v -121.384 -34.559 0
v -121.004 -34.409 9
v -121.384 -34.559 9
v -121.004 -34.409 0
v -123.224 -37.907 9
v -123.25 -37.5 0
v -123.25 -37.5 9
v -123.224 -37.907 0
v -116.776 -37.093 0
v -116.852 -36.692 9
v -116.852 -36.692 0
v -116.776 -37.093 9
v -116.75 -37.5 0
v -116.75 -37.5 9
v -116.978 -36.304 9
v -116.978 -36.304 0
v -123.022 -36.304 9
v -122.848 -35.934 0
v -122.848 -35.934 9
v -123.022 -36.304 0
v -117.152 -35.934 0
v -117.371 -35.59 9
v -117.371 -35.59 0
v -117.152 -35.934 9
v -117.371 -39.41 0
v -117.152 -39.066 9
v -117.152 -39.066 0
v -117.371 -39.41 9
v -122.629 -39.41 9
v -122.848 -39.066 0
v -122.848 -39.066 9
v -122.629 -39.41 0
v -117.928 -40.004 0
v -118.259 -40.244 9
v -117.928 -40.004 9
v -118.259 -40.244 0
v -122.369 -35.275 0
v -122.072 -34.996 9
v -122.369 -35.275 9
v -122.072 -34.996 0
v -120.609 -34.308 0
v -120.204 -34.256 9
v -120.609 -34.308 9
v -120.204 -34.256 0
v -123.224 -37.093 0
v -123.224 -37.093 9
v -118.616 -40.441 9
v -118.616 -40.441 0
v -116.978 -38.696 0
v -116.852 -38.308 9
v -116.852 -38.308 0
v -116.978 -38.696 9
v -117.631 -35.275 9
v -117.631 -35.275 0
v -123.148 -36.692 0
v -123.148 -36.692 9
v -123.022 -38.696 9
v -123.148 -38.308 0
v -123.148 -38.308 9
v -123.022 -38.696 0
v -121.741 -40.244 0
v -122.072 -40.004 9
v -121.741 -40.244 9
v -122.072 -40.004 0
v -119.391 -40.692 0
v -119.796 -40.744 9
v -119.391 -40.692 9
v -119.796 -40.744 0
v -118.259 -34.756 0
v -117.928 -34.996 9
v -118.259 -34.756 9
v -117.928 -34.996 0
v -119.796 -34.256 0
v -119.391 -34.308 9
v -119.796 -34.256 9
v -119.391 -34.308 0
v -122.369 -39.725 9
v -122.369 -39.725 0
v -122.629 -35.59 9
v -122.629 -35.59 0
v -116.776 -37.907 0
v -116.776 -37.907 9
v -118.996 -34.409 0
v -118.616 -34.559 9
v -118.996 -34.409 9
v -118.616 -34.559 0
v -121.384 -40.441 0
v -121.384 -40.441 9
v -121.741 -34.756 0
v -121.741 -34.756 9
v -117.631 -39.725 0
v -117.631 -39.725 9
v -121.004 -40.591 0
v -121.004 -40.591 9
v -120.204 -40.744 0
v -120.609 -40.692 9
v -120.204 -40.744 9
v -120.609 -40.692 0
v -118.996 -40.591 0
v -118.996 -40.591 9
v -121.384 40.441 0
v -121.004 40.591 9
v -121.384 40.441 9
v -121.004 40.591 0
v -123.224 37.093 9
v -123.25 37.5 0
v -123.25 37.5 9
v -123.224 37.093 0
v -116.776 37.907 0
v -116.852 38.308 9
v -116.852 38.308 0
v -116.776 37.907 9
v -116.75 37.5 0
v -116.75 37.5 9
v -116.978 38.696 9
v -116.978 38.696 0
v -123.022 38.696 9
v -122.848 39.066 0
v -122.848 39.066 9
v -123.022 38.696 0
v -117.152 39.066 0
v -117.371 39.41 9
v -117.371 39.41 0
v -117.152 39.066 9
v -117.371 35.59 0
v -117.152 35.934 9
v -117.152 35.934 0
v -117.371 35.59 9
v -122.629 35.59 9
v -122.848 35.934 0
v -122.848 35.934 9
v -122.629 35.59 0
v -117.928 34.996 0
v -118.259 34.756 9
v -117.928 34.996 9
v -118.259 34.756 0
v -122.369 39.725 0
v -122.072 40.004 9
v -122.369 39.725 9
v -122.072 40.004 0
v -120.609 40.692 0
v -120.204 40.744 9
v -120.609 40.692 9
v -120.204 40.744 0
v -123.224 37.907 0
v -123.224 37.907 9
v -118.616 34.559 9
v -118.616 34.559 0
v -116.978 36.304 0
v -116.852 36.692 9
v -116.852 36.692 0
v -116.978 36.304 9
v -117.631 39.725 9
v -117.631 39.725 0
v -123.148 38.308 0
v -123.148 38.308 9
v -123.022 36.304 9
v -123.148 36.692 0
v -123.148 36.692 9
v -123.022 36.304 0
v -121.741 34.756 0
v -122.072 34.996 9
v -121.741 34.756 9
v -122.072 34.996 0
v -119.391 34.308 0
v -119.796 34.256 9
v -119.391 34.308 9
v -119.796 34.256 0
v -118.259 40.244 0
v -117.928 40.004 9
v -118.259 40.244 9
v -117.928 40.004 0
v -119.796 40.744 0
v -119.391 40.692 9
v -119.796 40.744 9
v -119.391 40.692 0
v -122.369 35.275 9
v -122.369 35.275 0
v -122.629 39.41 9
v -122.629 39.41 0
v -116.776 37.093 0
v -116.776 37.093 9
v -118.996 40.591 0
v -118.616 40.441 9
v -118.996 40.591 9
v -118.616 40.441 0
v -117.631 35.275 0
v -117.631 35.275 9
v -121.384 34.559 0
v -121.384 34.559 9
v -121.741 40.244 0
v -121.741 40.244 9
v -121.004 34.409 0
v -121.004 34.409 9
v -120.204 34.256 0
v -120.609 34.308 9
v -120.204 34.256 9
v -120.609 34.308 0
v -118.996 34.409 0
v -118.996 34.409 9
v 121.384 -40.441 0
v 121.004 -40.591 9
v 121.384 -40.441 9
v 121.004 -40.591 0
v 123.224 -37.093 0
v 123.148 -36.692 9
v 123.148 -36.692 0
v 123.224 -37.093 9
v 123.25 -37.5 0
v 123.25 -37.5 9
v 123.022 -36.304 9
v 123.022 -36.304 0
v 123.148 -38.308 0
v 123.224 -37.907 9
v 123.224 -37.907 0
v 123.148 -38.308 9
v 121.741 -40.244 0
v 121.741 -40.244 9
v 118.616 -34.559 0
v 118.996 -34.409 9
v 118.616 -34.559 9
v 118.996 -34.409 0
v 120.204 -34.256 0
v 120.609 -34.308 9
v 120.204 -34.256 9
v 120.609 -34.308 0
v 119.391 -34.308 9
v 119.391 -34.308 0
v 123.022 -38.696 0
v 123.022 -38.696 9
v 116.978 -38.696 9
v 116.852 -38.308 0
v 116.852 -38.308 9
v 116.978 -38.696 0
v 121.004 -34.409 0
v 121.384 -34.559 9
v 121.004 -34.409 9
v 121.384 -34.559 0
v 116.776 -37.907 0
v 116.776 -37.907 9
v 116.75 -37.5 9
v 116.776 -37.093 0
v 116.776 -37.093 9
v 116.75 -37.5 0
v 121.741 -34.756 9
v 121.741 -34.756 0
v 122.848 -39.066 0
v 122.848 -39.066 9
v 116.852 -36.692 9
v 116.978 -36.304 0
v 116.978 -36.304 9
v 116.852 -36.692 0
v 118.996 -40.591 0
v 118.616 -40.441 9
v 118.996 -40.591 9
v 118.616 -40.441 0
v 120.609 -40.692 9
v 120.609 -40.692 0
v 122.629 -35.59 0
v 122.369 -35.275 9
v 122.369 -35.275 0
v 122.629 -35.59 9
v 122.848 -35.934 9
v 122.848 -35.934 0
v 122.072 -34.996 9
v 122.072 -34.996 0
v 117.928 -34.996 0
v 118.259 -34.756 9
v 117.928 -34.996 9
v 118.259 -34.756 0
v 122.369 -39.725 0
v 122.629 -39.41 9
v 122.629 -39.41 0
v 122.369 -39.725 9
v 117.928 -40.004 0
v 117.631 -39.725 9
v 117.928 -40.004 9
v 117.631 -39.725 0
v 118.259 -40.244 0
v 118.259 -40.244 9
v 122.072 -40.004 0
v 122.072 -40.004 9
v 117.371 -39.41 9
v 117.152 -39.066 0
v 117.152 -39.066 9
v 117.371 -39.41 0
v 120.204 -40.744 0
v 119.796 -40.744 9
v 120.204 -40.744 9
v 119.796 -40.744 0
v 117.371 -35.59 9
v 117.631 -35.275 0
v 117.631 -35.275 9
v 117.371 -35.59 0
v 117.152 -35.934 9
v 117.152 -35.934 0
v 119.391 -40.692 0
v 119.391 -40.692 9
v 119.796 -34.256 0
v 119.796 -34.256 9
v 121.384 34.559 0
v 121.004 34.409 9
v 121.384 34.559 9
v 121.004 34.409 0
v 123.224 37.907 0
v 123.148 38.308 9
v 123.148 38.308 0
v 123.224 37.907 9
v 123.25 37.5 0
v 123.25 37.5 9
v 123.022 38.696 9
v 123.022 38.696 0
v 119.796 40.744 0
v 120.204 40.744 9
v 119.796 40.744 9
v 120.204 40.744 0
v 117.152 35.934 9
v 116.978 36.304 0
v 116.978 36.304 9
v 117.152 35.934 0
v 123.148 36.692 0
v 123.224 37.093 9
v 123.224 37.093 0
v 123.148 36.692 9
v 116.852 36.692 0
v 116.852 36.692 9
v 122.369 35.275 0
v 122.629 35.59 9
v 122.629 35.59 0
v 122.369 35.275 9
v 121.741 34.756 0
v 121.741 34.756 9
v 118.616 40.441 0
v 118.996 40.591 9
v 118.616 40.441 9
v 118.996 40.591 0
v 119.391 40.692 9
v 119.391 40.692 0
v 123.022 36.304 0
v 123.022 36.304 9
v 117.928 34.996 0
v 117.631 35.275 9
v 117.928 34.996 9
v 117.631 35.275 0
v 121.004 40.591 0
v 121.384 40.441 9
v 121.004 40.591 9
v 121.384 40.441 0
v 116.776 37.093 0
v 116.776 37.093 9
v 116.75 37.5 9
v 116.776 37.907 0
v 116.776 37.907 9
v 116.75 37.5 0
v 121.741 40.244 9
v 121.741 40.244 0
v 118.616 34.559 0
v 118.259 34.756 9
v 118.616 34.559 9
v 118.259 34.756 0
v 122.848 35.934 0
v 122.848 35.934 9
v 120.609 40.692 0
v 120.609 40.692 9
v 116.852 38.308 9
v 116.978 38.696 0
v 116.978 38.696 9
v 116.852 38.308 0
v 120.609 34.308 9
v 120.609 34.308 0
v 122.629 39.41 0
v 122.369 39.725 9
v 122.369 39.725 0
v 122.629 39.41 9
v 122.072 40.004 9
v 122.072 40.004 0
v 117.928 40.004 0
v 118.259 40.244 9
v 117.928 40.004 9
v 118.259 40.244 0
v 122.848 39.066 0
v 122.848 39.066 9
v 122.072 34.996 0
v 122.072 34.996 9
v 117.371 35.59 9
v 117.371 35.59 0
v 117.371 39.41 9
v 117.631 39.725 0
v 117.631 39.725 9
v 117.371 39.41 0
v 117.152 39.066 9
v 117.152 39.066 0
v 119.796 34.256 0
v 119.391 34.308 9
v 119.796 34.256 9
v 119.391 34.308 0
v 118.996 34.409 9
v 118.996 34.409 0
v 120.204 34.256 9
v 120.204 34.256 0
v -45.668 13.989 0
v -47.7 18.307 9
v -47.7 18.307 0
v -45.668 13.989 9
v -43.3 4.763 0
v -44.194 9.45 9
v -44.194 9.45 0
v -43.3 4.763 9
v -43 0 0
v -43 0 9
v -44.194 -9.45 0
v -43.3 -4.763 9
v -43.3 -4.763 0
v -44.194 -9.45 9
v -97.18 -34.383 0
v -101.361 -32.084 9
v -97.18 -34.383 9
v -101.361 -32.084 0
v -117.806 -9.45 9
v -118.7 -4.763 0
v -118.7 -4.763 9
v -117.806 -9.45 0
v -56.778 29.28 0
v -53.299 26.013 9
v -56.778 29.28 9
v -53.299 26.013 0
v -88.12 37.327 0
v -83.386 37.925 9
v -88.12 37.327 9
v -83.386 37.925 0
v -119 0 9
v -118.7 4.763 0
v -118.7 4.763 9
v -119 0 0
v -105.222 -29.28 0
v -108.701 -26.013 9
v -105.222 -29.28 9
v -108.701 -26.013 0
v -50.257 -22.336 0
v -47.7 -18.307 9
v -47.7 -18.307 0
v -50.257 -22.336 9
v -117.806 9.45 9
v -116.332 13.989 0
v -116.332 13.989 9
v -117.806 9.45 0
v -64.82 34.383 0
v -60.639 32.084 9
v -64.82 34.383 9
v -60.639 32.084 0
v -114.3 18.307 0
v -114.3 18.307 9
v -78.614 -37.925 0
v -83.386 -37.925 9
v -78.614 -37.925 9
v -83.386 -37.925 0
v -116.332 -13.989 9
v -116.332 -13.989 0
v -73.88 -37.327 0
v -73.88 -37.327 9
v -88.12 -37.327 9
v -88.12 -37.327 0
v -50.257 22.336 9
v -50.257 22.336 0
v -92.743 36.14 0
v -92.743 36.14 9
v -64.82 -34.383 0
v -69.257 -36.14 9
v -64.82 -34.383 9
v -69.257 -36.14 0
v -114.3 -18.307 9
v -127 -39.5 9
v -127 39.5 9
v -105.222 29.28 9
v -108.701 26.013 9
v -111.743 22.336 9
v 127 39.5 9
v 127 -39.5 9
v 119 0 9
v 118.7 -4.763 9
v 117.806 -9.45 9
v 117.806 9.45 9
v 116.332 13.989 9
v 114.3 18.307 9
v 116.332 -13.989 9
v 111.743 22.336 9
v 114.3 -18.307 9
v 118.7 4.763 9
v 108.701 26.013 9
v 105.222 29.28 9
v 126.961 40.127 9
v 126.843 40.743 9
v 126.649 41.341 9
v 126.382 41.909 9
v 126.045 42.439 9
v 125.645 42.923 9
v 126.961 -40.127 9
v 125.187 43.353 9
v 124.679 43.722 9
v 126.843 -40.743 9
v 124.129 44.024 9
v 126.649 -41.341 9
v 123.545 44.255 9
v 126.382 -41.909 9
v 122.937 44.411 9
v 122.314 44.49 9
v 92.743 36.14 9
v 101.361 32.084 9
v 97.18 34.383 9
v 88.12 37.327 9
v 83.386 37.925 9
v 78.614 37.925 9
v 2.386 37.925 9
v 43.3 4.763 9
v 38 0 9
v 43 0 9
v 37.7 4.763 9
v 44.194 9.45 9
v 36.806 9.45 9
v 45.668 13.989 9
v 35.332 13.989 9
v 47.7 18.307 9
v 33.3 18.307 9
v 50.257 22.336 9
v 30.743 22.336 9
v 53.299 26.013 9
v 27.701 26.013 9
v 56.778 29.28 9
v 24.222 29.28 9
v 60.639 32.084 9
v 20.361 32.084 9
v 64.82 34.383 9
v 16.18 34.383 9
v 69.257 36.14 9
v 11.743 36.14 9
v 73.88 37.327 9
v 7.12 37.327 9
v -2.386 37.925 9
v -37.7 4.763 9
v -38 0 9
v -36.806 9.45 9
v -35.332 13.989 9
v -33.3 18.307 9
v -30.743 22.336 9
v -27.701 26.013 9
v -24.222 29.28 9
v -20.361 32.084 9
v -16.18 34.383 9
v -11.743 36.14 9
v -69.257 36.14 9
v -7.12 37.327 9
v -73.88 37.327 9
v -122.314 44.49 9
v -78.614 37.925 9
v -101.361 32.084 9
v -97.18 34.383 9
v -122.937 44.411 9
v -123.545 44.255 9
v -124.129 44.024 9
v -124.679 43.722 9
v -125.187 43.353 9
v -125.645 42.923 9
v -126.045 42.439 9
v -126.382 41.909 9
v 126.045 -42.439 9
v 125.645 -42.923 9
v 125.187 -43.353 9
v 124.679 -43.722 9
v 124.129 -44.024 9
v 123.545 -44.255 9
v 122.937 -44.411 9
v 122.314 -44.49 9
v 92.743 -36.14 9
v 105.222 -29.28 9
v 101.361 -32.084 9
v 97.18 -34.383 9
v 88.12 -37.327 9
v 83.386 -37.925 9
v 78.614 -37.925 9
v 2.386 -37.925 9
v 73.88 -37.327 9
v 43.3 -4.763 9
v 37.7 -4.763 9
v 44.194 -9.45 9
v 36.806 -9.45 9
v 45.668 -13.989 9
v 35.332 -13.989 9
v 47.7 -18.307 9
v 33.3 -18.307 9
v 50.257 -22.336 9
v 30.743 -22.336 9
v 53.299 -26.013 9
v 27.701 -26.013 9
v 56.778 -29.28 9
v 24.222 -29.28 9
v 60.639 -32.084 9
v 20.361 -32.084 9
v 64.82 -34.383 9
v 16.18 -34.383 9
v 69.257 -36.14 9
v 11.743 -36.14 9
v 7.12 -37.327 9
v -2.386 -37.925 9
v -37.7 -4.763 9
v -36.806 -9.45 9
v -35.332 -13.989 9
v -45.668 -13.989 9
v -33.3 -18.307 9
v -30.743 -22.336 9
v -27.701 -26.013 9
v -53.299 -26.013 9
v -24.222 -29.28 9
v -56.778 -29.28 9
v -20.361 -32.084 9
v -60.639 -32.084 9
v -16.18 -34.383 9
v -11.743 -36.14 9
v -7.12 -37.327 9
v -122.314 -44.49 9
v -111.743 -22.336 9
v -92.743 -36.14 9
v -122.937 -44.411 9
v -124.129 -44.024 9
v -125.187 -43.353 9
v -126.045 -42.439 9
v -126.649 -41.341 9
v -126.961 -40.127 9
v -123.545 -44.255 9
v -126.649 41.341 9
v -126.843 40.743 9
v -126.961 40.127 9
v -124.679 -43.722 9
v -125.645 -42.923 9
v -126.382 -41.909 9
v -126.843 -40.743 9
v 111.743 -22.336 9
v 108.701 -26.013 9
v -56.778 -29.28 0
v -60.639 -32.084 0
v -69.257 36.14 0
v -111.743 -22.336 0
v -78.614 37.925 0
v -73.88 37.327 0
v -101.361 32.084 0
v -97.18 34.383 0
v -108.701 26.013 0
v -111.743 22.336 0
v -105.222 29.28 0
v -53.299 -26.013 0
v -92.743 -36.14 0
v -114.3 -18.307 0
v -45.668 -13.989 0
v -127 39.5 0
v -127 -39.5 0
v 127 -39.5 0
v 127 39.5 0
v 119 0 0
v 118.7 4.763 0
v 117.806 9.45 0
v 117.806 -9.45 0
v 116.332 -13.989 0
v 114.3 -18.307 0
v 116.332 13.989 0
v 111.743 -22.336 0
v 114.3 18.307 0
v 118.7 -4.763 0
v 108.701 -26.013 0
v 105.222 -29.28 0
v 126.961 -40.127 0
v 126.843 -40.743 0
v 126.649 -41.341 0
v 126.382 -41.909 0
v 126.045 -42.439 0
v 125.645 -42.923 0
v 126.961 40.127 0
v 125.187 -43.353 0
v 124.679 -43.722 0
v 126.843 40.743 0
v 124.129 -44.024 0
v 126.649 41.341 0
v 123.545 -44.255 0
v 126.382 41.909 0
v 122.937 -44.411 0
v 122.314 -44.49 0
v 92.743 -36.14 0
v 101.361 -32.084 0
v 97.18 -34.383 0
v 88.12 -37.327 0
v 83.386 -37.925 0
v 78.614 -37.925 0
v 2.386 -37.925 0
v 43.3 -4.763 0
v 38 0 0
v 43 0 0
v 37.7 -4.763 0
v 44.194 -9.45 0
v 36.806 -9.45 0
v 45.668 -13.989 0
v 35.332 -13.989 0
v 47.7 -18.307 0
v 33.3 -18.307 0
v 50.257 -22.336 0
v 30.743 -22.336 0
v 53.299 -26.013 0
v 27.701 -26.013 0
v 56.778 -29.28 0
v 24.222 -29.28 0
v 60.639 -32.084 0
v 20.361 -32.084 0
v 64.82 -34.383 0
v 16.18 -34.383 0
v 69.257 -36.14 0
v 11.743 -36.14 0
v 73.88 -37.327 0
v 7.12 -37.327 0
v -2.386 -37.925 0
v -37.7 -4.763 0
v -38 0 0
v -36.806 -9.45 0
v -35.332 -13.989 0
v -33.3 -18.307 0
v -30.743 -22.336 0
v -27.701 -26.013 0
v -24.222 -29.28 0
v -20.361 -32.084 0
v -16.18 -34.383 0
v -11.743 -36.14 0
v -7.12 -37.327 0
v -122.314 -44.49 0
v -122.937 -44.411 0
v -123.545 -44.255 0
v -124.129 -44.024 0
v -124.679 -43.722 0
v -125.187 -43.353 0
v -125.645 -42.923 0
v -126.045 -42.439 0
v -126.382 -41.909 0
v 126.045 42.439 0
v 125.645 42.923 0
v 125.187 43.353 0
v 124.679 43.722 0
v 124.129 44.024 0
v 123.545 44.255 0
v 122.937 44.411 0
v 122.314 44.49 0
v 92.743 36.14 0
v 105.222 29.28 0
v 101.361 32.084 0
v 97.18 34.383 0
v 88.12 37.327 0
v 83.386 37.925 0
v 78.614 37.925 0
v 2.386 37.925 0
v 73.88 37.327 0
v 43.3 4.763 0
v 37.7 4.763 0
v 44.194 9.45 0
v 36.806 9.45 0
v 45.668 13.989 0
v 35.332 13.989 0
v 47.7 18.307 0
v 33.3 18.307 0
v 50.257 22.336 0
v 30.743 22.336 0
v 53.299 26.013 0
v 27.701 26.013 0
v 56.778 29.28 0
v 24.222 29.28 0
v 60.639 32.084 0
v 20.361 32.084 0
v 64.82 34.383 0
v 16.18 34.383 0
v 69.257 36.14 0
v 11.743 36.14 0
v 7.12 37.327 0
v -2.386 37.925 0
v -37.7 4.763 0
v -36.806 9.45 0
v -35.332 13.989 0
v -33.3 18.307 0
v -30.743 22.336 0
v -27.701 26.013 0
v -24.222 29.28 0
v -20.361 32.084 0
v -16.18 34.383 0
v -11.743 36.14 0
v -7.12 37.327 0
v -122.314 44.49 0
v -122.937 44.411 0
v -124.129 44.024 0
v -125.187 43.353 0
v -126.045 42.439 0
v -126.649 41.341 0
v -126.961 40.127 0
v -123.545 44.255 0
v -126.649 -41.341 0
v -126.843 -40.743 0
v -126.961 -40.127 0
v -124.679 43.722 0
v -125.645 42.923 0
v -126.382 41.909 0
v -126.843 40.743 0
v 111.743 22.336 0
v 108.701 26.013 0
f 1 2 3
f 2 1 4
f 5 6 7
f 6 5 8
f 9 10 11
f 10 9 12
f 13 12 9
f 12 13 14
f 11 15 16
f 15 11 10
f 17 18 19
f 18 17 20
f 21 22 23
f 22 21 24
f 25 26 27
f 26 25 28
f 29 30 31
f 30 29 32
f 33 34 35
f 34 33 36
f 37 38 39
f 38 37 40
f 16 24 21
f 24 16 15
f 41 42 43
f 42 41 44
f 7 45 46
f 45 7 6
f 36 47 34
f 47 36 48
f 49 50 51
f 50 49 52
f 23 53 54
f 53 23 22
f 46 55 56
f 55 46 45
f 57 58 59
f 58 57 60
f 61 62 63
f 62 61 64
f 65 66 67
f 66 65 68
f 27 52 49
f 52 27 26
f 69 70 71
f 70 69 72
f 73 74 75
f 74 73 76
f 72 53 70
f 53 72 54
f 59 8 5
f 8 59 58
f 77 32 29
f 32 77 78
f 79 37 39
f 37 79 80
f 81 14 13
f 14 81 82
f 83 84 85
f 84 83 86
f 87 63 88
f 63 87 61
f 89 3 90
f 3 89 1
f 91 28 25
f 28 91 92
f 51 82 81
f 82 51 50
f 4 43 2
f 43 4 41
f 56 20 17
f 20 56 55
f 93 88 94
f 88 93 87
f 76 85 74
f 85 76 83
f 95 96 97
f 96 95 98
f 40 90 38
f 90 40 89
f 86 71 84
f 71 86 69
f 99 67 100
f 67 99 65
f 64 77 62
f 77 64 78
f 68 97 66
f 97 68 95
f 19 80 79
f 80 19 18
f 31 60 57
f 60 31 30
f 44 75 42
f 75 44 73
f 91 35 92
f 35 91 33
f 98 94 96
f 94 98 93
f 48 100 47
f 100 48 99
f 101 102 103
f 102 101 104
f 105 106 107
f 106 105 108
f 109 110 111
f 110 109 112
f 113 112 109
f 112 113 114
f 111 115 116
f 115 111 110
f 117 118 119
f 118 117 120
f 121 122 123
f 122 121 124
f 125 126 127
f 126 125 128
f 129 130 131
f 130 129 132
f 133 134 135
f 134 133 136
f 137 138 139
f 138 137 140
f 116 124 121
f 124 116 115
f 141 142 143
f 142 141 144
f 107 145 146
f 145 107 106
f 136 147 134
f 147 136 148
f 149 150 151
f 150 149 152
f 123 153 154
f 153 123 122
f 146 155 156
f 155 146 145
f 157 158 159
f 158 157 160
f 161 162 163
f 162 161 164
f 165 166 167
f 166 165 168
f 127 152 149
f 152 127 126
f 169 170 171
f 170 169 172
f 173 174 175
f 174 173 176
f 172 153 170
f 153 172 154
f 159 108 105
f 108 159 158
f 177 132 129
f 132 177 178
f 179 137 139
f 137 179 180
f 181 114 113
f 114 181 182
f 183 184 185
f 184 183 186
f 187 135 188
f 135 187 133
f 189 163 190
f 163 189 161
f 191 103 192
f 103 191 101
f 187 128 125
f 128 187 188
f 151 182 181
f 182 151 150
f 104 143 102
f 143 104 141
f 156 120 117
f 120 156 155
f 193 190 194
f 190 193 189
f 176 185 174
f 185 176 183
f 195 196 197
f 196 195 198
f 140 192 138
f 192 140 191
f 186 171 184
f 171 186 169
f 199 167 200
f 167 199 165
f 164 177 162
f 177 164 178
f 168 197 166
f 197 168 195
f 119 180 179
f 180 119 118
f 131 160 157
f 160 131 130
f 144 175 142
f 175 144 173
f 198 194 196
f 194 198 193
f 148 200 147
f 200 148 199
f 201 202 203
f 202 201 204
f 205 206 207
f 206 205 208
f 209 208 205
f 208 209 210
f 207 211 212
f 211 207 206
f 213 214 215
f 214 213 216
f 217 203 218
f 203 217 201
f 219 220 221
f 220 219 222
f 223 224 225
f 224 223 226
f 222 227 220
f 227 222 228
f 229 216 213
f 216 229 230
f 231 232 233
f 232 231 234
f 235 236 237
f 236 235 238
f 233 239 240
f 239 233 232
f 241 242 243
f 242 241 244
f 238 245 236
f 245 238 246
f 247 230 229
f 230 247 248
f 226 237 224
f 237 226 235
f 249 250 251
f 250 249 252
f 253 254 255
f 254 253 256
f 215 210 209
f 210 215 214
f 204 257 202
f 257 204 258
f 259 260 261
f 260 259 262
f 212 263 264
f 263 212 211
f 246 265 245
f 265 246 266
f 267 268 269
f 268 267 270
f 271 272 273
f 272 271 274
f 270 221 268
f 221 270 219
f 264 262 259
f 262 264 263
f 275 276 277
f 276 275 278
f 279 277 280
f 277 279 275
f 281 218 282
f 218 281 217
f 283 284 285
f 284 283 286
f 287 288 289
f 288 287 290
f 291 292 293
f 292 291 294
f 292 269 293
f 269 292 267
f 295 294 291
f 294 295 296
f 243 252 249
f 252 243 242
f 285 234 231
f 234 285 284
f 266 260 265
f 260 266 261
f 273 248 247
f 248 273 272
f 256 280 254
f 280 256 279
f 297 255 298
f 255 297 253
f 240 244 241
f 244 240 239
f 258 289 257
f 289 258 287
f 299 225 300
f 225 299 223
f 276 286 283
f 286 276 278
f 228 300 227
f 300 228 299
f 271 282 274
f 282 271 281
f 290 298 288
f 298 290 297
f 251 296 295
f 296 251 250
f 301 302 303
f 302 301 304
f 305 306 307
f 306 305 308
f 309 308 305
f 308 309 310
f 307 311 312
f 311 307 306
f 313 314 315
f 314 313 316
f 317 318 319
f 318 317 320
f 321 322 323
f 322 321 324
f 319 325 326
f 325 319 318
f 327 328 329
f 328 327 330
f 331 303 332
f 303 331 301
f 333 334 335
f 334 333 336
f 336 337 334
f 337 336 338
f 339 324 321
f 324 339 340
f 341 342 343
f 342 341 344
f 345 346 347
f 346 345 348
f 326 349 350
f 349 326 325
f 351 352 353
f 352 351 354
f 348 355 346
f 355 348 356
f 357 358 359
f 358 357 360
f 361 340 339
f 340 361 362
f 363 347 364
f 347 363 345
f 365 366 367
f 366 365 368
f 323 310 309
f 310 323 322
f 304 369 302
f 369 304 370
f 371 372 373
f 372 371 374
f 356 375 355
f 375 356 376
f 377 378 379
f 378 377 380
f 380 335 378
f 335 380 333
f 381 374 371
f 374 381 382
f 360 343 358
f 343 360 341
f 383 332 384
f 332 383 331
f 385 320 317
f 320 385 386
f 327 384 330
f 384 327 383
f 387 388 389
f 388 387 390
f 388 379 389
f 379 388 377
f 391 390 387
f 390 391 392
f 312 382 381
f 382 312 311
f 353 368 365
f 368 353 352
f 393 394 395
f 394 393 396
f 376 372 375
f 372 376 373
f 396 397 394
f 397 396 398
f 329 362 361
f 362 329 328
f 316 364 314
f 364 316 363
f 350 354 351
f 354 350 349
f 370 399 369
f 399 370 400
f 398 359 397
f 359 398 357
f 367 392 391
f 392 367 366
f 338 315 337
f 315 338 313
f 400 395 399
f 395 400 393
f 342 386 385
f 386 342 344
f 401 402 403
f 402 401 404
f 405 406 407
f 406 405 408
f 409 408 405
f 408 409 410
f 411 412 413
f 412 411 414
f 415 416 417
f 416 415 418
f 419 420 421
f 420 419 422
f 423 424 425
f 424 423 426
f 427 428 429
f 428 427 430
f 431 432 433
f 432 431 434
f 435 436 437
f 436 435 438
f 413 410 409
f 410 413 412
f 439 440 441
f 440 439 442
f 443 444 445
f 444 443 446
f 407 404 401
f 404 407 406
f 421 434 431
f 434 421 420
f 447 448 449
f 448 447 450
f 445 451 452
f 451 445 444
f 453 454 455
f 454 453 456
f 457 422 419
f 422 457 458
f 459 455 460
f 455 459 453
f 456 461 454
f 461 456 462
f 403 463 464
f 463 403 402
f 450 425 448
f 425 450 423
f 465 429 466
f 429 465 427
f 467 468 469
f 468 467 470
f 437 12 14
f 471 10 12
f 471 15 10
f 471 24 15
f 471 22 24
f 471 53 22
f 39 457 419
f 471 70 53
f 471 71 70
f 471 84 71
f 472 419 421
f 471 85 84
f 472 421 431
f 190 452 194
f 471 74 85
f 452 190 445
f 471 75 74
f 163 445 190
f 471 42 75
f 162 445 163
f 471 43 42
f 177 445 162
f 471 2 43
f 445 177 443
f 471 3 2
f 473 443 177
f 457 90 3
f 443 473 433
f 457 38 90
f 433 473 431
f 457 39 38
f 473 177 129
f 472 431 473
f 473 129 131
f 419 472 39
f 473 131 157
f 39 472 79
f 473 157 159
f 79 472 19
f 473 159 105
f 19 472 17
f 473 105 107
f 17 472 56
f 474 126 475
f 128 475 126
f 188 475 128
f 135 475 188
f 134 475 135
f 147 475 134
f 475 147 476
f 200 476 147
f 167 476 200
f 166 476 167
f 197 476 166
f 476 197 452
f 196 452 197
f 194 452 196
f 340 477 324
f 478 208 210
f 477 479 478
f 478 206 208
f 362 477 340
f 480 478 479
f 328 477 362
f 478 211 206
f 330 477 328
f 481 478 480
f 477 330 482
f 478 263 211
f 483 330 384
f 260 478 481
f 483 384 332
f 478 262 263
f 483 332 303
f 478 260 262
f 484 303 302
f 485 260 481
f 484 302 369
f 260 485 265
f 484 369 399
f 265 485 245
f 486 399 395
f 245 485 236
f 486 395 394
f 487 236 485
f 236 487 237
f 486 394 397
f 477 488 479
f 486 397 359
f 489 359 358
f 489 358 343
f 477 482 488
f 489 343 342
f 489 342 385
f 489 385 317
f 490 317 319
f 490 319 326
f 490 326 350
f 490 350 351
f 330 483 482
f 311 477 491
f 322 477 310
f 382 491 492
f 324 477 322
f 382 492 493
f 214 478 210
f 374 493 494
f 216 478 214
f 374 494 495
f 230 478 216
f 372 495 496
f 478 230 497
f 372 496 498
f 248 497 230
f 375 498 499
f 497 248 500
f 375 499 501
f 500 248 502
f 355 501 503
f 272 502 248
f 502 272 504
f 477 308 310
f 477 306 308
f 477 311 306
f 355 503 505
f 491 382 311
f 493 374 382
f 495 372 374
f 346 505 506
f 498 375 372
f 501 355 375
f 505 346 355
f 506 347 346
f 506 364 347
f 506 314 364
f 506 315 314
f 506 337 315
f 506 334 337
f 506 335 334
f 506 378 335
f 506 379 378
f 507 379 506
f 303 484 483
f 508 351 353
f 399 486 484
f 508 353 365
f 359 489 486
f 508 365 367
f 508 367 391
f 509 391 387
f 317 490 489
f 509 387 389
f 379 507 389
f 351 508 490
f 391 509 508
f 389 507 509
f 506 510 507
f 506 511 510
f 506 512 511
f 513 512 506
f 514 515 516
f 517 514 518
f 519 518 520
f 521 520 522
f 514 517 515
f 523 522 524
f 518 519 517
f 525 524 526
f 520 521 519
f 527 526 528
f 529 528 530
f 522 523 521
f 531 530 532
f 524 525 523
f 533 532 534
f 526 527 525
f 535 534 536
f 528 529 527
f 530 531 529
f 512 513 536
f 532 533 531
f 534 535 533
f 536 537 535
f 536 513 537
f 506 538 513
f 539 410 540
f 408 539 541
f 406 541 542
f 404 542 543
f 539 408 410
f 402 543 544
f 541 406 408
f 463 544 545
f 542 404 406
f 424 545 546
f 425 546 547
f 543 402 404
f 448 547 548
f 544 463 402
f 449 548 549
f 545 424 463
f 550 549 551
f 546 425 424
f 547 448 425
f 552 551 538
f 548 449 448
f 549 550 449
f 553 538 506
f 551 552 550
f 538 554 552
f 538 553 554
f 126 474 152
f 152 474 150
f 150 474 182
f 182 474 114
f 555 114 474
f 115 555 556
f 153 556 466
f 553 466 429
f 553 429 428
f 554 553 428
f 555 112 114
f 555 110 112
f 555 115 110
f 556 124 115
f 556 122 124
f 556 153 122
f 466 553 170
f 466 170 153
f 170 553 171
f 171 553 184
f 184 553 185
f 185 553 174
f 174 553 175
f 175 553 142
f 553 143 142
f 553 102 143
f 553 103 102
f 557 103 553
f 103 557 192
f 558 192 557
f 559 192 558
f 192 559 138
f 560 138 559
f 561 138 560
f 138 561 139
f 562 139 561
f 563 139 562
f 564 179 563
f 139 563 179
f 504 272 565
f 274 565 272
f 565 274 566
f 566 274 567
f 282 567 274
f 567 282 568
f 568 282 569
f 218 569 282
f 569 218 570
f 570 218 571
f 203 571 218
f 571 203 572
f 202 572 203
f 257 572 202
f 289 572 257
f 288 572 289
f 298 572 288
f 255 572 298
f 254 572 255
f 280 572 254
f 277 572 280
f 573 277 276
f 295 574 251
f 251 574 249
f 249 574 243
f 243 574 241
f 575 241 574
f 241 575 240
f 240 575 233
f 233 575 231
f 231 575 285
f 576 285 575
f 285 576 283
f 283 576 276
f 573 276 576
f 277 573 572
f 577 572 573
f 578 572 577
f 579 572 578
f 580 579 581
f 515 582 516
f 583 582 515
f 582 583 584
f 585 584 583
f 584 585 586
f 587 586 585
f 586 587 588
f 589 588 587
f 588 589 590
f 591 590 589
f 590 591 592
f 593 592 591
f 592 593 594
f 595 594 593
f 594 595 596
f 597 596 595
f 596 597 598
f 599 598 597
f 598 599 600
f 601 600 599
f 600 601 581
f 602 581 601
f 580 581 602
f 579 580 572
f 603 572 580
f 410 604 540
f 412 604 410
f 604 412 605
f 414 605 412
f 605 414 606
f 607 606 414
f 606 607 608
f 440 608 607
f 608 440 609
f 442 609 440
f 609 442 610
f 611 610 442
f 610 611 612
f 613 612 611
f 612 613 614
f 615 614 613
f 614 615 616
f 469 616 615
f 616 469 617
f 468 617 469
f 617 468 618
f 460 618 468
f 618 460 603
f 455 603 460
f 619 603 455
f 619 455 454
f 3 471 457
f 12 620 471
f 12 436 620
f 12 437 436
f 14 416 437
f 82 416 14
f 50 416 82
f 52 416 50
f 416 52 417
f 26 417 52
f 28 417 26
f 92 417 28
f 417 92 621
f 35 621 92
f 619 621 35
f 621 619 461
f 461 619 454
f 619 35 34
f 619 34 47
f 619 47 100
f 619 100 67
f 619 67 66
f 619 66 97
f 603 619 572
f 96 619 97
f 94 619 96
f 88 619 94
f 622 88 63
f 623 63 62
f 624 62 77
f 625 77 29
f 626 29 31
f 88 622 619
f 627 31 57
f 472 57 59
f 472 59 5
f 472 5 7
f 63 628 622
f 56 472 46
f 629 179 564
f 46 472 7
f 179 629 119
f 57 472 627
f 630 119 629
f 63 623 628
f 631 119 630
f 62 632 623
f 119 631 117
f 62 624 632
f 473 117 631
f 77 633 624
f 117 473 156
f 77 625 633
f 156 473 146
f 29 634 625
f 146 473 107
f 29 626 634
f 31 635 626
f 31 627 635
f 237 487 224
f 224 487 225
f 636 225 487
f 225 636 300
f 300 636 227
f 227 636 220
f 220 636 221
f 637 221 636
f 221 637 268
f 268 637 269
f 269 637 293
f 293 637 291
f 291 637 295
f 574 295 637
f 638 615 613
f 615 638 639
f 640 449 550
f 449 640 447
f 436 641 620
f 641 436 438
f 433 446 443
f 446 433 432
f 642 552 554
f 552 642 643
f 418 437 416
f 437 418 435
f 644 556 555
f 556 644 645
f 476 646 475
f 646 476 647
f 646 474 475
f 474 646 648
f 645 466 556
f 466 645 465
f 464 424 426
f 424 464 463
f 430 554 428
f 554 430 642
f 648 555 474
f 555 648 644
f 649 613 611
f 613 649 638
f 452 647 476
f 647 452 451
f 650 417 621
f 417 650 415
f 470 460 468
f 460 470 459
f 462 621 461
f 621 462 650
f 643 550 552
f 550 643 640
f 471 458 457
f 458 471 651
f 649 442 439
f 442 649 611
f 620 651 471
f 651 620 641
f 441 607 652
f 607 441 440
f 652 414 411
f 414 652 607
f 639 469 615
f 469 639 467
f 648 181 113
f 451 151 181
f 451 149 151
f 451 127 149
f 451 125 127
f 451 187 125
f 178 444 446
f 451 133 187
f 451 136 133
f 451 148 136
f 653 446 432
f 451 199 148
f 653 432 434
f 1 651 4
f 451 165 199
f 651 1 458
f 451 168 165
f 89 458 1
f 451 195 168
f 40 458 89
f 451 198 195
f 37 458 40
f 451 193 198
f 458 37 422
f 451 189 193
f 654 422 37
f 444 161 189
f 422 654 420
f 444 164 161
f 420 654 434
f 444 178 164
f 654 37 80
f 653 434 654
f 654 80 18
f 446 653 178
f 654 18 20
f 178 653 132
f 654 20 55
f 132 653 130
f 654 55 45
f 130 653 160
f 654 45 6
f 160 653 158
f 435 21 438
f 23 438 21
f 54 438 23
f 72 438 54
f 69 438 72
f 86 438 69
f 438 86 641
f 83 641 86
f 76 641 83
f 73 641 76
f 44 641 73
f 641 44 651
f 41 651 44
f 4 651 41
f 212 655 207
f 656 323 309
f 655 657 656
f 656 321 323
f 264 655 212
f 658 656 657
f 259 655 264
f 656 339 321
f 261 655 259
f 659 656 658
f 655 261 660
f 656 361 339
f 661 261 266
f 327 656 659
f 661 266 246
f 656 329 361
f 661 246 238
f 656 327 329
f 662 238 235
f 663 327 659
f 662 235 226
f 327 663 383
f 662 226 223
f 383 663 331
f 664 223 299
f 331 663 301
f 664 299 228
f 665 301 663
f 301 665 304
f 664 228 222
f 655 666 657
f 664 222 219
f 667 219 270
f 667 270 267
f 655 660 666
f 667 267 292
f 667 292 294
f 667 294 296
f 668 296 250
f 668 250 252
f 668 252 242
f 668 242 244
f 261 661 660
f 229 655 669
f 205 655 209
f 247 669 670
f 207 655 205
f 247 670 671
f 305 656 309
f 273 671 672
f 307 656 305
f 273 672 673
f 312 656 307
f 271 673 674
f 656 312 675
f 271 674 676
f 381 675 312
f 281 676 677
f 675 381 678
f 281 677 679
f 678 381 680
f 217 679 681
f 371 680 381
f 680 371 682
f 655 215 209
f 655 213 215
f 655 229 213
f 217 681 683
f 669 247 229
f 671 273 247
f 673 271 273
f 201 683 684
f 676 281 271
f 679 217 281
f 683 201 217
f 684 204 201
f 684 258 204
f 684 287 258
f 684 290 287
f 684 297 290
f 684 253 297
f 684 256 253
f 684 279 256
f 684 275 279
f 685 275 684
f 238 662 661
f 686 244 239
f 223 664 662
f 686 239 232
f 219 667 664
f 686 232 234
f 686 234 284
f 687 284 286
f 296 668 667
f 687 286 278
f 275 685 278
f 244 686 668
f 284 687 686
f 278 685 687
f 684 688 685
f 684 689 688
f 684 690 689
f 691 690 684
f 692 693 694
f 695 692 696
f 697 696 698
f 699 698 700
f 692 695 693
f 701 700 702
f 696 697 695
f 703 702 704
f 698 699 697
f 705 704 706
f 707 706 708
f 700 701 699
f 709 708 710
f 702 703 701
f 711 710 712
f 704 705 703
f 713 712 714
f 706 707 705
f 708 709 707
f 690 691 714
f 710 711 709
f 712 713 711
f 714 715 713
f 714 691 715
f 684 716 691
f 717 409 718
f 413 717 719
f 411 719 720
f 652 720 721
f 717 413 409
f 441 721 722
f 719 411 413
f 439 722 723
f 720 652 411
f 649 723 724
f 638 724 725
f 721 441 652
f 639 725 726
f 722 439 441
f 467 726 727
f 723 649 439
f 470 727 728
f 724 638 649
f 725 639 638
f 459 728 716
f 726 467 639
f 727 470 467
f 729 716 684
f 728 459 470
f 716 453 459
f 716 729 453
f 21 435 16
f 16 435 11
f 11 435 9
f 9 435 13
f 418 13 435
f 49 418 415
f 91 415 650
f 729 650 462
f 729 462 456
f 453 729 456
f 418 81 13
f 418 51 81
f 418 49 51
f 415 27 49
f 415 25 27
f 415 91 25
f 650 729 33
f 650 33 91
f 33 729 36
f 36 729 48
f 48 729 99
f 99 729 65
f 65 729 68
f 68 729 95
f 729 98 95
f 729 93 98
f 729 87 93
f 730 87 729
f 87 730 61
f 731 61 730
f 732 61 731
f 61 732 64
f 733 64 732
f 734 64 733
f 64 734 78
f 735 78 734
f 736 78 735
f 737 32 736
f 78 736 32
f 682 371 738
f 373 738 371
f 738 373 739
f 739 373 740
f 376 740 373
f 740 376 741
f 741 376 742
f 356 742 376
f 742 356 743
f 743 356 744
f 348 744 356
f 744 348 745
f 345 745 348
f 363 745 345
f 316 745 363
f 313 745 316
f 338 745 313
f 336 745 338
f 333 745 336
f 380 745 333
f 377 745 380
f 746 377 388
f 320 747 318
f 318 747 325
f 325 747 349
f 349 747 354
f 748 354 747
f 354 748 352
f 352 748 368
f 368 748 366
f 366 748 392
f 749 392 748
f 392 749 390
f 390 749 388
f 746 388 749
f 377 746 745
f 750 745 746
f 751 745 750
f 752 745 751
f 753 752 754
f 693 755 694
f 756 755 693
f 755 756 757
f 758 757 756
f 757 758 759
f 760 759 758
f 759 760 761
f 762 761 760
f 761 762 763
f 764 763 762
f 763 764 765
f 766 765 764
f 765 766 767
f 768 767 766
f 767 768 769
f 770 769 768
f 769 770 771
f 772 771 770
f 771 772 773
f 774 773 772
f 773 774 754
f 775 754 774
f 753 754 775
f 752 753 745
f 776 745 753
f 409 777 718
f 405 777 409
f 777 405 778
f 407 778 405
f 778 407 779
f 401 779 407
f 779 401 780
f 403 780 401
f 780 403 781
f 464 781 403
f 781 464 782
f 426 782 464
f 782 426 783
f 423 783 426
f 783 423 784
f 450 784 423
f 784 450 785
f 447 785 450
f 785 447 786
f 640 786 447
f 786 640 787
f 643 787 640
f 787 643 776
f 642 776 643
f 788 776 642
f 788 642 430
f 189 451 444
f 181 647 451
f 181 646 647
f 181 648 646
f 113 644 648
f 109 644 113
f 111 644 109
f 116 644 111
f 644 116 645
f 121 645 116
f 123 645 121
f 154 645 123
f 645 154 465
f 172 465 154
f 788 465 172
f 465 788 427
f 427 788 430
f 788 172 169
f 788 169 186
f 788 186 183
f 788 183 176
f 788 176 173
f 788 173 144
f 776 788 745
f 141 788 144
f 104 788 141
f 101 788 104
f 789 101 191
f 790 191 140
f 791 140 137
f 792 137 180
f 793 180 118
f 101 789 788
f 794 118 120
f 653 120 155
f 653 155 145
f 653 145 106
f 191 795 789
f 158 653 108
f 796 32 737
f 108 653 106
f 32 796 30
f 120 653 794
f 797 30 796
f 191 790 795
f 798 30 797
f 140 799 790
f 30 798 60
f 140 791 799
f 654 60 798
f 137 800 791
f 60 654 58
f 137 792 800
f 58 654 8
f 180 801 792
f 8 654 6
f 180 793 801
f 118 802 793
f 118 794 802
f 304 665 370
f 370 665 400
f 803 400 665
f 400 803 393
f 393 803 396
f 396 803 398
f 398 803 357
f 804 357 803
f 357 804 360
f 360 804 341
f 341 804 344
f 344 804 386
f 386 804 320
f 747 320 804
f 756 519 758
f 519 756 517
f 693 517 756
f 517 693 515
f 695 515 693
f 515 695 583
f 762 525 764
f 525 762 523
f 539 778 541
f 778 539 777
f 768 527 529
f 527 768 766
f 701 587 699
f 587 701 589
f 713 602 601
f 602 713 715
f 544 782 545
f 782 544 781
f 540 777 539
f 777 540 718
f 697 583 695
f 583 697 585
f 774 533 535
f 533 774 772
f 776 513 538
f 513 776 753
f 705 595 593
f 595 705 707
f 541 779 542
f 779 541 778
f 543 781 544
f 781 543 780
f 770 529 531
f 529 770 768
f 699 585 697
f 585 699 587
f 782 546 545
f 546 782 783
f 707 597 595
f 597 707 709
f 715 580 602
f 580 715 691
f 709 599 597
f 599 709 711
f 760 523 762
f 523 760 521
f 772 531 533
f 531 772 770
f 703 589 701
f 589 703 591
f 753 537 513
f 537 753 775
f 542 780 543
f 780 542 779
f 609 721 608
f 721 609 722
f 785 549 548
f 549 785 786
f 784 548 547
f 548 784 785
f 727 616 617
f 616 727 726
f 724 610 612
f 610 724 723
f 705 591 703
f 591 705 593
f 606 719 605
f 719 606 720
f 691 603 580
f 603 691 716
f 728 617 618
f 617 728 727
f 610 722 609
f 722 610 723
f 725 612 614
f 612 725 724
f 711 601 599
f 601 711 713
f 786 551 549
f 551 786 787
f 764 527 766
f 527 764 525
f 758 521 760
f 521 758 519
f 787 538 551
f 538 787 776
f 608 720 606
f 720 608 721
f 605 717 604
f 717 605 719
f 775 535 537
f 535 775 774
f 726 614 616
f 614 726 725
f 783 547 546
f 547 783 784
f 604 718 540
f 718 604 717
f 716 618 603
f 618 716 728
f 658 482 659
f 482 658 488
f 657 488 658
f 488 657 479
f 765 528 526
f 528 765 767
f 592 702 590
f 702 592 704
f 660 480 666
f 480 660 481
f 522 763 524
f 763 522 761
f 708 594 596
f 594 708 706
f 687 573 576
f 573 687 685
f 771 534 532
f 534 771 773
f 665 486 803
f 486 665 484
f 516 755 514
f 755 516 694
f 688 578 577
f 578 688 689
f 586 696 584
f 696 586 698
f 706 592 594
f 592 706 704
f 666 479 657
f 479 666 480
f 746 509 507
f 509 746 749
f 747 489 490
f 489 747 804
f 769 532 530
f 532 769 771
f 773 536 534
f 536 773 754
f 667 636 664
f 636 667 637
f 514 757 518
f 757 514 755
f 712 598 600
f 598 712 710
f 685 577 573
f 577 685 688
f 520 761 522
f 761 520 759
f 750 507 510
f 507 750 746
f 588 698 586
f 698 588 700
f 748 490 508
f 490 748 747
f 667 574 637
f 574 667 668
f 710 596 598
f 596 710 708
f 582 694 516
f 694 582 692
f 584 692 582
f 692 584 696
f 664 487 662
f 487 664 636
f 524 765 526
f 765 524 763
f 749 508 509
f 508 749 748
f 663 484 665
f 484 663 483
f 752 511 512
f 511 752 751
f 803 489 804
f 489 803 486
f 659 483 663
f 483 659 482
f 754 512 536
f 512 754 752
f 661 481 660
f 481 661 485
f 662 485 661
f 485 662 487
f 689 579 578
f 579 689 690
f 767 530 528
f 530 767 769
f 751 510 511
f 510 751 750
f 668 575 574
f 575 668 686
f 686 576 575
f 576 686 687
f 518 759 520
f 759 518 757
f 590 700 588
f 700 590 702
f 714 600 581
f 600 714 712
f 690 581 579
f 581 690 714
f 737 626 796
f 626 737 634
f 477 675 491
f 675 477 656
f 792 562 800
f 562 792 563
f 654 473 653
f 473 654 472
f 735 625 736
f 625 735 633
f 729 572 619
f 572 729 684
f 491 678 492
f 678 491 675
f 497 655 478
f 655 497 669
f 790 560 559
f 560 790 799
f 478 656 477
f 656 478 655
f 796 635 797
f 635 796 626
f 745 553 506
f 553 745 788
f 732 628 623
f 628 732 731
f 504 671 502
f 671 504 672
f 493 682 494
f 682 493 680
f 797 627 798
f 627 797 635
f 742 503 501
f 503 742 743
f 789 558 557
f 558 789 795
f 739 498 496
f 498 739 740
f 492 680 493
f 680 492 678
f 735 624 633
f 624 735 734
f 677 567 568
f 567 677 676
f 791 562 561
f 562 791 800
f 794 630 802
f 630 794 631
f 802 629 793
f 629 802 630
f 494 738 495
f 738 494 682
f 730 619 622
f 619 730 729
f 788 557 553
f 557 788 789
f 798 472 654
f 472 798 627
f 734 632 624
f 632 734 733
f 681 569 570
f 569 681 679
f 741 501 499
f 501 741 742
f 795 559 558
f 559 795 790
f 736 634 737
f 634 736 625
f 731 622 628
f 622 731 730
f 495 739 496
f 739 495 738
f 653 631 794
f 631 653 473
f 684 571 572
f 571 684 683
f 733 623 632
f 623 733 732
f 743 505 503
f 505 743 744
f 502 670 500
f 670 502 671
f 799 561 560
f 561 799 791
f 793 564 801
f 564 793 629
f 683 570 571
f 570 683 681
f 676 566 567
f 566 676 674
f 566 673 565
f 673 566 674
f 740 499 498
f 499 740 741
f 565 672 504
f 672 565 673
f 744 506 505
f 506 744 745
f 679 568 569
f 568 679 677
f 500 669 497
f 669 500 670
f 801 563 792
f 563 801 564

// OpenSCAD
$fn = 50;


difference() {
	union() {
		hull() {
			translate(v = [-122.0000000000, 39.5000000000, 0]) {
				cylinder(h = 9, r = 5);
			}
			translate(v = [122.0000000000, 39.5000000000, 0]) {
				cylinder(h = 9, r = 5);
			}
			translate(v = [-122.0000000000, -39.5000000000, 0]) {
				cylinder(h = 9, r = 5);
			}
			translate(v = [122.0000000000, -39.5000000000, 0]) {
				cylinder(h = 9, r = 5);
			}
		}
	}
	union() {
		#translate(v = [-120.0000000000, -37.5000000000, -100.0000000000]) {
			cylinder(h = 200, r = 3.2500000000);
		}
		#translate(v = [-120.0000000000, 37.5000000000, -100.0000000000]) {
			cylinder(h = 200, r = 3.2500000000);
		}
		#translate(v = [120.0000000000, -37.5000000000, -100.0000000000]) {
			cylinder(h = 200, r = 3.2500000000);
		}
		#translate(v = [120.0000000000, 37.5000000000, -100.0000000000]) {
			cylinder(h = 200, r = 3.2500000000);
		}
		#translate(v = [-81.0000000000, 0, 0]) {
			cylinder(h = 9, r = 38.0000000000);
		}
		#cylinder(h = 9, r = 38.0000000000);
		#translate(v = [81.0000000000, 0, 0]) {
			cylinder(h = 9, r = 38.0000000000);
		}
	}
}
